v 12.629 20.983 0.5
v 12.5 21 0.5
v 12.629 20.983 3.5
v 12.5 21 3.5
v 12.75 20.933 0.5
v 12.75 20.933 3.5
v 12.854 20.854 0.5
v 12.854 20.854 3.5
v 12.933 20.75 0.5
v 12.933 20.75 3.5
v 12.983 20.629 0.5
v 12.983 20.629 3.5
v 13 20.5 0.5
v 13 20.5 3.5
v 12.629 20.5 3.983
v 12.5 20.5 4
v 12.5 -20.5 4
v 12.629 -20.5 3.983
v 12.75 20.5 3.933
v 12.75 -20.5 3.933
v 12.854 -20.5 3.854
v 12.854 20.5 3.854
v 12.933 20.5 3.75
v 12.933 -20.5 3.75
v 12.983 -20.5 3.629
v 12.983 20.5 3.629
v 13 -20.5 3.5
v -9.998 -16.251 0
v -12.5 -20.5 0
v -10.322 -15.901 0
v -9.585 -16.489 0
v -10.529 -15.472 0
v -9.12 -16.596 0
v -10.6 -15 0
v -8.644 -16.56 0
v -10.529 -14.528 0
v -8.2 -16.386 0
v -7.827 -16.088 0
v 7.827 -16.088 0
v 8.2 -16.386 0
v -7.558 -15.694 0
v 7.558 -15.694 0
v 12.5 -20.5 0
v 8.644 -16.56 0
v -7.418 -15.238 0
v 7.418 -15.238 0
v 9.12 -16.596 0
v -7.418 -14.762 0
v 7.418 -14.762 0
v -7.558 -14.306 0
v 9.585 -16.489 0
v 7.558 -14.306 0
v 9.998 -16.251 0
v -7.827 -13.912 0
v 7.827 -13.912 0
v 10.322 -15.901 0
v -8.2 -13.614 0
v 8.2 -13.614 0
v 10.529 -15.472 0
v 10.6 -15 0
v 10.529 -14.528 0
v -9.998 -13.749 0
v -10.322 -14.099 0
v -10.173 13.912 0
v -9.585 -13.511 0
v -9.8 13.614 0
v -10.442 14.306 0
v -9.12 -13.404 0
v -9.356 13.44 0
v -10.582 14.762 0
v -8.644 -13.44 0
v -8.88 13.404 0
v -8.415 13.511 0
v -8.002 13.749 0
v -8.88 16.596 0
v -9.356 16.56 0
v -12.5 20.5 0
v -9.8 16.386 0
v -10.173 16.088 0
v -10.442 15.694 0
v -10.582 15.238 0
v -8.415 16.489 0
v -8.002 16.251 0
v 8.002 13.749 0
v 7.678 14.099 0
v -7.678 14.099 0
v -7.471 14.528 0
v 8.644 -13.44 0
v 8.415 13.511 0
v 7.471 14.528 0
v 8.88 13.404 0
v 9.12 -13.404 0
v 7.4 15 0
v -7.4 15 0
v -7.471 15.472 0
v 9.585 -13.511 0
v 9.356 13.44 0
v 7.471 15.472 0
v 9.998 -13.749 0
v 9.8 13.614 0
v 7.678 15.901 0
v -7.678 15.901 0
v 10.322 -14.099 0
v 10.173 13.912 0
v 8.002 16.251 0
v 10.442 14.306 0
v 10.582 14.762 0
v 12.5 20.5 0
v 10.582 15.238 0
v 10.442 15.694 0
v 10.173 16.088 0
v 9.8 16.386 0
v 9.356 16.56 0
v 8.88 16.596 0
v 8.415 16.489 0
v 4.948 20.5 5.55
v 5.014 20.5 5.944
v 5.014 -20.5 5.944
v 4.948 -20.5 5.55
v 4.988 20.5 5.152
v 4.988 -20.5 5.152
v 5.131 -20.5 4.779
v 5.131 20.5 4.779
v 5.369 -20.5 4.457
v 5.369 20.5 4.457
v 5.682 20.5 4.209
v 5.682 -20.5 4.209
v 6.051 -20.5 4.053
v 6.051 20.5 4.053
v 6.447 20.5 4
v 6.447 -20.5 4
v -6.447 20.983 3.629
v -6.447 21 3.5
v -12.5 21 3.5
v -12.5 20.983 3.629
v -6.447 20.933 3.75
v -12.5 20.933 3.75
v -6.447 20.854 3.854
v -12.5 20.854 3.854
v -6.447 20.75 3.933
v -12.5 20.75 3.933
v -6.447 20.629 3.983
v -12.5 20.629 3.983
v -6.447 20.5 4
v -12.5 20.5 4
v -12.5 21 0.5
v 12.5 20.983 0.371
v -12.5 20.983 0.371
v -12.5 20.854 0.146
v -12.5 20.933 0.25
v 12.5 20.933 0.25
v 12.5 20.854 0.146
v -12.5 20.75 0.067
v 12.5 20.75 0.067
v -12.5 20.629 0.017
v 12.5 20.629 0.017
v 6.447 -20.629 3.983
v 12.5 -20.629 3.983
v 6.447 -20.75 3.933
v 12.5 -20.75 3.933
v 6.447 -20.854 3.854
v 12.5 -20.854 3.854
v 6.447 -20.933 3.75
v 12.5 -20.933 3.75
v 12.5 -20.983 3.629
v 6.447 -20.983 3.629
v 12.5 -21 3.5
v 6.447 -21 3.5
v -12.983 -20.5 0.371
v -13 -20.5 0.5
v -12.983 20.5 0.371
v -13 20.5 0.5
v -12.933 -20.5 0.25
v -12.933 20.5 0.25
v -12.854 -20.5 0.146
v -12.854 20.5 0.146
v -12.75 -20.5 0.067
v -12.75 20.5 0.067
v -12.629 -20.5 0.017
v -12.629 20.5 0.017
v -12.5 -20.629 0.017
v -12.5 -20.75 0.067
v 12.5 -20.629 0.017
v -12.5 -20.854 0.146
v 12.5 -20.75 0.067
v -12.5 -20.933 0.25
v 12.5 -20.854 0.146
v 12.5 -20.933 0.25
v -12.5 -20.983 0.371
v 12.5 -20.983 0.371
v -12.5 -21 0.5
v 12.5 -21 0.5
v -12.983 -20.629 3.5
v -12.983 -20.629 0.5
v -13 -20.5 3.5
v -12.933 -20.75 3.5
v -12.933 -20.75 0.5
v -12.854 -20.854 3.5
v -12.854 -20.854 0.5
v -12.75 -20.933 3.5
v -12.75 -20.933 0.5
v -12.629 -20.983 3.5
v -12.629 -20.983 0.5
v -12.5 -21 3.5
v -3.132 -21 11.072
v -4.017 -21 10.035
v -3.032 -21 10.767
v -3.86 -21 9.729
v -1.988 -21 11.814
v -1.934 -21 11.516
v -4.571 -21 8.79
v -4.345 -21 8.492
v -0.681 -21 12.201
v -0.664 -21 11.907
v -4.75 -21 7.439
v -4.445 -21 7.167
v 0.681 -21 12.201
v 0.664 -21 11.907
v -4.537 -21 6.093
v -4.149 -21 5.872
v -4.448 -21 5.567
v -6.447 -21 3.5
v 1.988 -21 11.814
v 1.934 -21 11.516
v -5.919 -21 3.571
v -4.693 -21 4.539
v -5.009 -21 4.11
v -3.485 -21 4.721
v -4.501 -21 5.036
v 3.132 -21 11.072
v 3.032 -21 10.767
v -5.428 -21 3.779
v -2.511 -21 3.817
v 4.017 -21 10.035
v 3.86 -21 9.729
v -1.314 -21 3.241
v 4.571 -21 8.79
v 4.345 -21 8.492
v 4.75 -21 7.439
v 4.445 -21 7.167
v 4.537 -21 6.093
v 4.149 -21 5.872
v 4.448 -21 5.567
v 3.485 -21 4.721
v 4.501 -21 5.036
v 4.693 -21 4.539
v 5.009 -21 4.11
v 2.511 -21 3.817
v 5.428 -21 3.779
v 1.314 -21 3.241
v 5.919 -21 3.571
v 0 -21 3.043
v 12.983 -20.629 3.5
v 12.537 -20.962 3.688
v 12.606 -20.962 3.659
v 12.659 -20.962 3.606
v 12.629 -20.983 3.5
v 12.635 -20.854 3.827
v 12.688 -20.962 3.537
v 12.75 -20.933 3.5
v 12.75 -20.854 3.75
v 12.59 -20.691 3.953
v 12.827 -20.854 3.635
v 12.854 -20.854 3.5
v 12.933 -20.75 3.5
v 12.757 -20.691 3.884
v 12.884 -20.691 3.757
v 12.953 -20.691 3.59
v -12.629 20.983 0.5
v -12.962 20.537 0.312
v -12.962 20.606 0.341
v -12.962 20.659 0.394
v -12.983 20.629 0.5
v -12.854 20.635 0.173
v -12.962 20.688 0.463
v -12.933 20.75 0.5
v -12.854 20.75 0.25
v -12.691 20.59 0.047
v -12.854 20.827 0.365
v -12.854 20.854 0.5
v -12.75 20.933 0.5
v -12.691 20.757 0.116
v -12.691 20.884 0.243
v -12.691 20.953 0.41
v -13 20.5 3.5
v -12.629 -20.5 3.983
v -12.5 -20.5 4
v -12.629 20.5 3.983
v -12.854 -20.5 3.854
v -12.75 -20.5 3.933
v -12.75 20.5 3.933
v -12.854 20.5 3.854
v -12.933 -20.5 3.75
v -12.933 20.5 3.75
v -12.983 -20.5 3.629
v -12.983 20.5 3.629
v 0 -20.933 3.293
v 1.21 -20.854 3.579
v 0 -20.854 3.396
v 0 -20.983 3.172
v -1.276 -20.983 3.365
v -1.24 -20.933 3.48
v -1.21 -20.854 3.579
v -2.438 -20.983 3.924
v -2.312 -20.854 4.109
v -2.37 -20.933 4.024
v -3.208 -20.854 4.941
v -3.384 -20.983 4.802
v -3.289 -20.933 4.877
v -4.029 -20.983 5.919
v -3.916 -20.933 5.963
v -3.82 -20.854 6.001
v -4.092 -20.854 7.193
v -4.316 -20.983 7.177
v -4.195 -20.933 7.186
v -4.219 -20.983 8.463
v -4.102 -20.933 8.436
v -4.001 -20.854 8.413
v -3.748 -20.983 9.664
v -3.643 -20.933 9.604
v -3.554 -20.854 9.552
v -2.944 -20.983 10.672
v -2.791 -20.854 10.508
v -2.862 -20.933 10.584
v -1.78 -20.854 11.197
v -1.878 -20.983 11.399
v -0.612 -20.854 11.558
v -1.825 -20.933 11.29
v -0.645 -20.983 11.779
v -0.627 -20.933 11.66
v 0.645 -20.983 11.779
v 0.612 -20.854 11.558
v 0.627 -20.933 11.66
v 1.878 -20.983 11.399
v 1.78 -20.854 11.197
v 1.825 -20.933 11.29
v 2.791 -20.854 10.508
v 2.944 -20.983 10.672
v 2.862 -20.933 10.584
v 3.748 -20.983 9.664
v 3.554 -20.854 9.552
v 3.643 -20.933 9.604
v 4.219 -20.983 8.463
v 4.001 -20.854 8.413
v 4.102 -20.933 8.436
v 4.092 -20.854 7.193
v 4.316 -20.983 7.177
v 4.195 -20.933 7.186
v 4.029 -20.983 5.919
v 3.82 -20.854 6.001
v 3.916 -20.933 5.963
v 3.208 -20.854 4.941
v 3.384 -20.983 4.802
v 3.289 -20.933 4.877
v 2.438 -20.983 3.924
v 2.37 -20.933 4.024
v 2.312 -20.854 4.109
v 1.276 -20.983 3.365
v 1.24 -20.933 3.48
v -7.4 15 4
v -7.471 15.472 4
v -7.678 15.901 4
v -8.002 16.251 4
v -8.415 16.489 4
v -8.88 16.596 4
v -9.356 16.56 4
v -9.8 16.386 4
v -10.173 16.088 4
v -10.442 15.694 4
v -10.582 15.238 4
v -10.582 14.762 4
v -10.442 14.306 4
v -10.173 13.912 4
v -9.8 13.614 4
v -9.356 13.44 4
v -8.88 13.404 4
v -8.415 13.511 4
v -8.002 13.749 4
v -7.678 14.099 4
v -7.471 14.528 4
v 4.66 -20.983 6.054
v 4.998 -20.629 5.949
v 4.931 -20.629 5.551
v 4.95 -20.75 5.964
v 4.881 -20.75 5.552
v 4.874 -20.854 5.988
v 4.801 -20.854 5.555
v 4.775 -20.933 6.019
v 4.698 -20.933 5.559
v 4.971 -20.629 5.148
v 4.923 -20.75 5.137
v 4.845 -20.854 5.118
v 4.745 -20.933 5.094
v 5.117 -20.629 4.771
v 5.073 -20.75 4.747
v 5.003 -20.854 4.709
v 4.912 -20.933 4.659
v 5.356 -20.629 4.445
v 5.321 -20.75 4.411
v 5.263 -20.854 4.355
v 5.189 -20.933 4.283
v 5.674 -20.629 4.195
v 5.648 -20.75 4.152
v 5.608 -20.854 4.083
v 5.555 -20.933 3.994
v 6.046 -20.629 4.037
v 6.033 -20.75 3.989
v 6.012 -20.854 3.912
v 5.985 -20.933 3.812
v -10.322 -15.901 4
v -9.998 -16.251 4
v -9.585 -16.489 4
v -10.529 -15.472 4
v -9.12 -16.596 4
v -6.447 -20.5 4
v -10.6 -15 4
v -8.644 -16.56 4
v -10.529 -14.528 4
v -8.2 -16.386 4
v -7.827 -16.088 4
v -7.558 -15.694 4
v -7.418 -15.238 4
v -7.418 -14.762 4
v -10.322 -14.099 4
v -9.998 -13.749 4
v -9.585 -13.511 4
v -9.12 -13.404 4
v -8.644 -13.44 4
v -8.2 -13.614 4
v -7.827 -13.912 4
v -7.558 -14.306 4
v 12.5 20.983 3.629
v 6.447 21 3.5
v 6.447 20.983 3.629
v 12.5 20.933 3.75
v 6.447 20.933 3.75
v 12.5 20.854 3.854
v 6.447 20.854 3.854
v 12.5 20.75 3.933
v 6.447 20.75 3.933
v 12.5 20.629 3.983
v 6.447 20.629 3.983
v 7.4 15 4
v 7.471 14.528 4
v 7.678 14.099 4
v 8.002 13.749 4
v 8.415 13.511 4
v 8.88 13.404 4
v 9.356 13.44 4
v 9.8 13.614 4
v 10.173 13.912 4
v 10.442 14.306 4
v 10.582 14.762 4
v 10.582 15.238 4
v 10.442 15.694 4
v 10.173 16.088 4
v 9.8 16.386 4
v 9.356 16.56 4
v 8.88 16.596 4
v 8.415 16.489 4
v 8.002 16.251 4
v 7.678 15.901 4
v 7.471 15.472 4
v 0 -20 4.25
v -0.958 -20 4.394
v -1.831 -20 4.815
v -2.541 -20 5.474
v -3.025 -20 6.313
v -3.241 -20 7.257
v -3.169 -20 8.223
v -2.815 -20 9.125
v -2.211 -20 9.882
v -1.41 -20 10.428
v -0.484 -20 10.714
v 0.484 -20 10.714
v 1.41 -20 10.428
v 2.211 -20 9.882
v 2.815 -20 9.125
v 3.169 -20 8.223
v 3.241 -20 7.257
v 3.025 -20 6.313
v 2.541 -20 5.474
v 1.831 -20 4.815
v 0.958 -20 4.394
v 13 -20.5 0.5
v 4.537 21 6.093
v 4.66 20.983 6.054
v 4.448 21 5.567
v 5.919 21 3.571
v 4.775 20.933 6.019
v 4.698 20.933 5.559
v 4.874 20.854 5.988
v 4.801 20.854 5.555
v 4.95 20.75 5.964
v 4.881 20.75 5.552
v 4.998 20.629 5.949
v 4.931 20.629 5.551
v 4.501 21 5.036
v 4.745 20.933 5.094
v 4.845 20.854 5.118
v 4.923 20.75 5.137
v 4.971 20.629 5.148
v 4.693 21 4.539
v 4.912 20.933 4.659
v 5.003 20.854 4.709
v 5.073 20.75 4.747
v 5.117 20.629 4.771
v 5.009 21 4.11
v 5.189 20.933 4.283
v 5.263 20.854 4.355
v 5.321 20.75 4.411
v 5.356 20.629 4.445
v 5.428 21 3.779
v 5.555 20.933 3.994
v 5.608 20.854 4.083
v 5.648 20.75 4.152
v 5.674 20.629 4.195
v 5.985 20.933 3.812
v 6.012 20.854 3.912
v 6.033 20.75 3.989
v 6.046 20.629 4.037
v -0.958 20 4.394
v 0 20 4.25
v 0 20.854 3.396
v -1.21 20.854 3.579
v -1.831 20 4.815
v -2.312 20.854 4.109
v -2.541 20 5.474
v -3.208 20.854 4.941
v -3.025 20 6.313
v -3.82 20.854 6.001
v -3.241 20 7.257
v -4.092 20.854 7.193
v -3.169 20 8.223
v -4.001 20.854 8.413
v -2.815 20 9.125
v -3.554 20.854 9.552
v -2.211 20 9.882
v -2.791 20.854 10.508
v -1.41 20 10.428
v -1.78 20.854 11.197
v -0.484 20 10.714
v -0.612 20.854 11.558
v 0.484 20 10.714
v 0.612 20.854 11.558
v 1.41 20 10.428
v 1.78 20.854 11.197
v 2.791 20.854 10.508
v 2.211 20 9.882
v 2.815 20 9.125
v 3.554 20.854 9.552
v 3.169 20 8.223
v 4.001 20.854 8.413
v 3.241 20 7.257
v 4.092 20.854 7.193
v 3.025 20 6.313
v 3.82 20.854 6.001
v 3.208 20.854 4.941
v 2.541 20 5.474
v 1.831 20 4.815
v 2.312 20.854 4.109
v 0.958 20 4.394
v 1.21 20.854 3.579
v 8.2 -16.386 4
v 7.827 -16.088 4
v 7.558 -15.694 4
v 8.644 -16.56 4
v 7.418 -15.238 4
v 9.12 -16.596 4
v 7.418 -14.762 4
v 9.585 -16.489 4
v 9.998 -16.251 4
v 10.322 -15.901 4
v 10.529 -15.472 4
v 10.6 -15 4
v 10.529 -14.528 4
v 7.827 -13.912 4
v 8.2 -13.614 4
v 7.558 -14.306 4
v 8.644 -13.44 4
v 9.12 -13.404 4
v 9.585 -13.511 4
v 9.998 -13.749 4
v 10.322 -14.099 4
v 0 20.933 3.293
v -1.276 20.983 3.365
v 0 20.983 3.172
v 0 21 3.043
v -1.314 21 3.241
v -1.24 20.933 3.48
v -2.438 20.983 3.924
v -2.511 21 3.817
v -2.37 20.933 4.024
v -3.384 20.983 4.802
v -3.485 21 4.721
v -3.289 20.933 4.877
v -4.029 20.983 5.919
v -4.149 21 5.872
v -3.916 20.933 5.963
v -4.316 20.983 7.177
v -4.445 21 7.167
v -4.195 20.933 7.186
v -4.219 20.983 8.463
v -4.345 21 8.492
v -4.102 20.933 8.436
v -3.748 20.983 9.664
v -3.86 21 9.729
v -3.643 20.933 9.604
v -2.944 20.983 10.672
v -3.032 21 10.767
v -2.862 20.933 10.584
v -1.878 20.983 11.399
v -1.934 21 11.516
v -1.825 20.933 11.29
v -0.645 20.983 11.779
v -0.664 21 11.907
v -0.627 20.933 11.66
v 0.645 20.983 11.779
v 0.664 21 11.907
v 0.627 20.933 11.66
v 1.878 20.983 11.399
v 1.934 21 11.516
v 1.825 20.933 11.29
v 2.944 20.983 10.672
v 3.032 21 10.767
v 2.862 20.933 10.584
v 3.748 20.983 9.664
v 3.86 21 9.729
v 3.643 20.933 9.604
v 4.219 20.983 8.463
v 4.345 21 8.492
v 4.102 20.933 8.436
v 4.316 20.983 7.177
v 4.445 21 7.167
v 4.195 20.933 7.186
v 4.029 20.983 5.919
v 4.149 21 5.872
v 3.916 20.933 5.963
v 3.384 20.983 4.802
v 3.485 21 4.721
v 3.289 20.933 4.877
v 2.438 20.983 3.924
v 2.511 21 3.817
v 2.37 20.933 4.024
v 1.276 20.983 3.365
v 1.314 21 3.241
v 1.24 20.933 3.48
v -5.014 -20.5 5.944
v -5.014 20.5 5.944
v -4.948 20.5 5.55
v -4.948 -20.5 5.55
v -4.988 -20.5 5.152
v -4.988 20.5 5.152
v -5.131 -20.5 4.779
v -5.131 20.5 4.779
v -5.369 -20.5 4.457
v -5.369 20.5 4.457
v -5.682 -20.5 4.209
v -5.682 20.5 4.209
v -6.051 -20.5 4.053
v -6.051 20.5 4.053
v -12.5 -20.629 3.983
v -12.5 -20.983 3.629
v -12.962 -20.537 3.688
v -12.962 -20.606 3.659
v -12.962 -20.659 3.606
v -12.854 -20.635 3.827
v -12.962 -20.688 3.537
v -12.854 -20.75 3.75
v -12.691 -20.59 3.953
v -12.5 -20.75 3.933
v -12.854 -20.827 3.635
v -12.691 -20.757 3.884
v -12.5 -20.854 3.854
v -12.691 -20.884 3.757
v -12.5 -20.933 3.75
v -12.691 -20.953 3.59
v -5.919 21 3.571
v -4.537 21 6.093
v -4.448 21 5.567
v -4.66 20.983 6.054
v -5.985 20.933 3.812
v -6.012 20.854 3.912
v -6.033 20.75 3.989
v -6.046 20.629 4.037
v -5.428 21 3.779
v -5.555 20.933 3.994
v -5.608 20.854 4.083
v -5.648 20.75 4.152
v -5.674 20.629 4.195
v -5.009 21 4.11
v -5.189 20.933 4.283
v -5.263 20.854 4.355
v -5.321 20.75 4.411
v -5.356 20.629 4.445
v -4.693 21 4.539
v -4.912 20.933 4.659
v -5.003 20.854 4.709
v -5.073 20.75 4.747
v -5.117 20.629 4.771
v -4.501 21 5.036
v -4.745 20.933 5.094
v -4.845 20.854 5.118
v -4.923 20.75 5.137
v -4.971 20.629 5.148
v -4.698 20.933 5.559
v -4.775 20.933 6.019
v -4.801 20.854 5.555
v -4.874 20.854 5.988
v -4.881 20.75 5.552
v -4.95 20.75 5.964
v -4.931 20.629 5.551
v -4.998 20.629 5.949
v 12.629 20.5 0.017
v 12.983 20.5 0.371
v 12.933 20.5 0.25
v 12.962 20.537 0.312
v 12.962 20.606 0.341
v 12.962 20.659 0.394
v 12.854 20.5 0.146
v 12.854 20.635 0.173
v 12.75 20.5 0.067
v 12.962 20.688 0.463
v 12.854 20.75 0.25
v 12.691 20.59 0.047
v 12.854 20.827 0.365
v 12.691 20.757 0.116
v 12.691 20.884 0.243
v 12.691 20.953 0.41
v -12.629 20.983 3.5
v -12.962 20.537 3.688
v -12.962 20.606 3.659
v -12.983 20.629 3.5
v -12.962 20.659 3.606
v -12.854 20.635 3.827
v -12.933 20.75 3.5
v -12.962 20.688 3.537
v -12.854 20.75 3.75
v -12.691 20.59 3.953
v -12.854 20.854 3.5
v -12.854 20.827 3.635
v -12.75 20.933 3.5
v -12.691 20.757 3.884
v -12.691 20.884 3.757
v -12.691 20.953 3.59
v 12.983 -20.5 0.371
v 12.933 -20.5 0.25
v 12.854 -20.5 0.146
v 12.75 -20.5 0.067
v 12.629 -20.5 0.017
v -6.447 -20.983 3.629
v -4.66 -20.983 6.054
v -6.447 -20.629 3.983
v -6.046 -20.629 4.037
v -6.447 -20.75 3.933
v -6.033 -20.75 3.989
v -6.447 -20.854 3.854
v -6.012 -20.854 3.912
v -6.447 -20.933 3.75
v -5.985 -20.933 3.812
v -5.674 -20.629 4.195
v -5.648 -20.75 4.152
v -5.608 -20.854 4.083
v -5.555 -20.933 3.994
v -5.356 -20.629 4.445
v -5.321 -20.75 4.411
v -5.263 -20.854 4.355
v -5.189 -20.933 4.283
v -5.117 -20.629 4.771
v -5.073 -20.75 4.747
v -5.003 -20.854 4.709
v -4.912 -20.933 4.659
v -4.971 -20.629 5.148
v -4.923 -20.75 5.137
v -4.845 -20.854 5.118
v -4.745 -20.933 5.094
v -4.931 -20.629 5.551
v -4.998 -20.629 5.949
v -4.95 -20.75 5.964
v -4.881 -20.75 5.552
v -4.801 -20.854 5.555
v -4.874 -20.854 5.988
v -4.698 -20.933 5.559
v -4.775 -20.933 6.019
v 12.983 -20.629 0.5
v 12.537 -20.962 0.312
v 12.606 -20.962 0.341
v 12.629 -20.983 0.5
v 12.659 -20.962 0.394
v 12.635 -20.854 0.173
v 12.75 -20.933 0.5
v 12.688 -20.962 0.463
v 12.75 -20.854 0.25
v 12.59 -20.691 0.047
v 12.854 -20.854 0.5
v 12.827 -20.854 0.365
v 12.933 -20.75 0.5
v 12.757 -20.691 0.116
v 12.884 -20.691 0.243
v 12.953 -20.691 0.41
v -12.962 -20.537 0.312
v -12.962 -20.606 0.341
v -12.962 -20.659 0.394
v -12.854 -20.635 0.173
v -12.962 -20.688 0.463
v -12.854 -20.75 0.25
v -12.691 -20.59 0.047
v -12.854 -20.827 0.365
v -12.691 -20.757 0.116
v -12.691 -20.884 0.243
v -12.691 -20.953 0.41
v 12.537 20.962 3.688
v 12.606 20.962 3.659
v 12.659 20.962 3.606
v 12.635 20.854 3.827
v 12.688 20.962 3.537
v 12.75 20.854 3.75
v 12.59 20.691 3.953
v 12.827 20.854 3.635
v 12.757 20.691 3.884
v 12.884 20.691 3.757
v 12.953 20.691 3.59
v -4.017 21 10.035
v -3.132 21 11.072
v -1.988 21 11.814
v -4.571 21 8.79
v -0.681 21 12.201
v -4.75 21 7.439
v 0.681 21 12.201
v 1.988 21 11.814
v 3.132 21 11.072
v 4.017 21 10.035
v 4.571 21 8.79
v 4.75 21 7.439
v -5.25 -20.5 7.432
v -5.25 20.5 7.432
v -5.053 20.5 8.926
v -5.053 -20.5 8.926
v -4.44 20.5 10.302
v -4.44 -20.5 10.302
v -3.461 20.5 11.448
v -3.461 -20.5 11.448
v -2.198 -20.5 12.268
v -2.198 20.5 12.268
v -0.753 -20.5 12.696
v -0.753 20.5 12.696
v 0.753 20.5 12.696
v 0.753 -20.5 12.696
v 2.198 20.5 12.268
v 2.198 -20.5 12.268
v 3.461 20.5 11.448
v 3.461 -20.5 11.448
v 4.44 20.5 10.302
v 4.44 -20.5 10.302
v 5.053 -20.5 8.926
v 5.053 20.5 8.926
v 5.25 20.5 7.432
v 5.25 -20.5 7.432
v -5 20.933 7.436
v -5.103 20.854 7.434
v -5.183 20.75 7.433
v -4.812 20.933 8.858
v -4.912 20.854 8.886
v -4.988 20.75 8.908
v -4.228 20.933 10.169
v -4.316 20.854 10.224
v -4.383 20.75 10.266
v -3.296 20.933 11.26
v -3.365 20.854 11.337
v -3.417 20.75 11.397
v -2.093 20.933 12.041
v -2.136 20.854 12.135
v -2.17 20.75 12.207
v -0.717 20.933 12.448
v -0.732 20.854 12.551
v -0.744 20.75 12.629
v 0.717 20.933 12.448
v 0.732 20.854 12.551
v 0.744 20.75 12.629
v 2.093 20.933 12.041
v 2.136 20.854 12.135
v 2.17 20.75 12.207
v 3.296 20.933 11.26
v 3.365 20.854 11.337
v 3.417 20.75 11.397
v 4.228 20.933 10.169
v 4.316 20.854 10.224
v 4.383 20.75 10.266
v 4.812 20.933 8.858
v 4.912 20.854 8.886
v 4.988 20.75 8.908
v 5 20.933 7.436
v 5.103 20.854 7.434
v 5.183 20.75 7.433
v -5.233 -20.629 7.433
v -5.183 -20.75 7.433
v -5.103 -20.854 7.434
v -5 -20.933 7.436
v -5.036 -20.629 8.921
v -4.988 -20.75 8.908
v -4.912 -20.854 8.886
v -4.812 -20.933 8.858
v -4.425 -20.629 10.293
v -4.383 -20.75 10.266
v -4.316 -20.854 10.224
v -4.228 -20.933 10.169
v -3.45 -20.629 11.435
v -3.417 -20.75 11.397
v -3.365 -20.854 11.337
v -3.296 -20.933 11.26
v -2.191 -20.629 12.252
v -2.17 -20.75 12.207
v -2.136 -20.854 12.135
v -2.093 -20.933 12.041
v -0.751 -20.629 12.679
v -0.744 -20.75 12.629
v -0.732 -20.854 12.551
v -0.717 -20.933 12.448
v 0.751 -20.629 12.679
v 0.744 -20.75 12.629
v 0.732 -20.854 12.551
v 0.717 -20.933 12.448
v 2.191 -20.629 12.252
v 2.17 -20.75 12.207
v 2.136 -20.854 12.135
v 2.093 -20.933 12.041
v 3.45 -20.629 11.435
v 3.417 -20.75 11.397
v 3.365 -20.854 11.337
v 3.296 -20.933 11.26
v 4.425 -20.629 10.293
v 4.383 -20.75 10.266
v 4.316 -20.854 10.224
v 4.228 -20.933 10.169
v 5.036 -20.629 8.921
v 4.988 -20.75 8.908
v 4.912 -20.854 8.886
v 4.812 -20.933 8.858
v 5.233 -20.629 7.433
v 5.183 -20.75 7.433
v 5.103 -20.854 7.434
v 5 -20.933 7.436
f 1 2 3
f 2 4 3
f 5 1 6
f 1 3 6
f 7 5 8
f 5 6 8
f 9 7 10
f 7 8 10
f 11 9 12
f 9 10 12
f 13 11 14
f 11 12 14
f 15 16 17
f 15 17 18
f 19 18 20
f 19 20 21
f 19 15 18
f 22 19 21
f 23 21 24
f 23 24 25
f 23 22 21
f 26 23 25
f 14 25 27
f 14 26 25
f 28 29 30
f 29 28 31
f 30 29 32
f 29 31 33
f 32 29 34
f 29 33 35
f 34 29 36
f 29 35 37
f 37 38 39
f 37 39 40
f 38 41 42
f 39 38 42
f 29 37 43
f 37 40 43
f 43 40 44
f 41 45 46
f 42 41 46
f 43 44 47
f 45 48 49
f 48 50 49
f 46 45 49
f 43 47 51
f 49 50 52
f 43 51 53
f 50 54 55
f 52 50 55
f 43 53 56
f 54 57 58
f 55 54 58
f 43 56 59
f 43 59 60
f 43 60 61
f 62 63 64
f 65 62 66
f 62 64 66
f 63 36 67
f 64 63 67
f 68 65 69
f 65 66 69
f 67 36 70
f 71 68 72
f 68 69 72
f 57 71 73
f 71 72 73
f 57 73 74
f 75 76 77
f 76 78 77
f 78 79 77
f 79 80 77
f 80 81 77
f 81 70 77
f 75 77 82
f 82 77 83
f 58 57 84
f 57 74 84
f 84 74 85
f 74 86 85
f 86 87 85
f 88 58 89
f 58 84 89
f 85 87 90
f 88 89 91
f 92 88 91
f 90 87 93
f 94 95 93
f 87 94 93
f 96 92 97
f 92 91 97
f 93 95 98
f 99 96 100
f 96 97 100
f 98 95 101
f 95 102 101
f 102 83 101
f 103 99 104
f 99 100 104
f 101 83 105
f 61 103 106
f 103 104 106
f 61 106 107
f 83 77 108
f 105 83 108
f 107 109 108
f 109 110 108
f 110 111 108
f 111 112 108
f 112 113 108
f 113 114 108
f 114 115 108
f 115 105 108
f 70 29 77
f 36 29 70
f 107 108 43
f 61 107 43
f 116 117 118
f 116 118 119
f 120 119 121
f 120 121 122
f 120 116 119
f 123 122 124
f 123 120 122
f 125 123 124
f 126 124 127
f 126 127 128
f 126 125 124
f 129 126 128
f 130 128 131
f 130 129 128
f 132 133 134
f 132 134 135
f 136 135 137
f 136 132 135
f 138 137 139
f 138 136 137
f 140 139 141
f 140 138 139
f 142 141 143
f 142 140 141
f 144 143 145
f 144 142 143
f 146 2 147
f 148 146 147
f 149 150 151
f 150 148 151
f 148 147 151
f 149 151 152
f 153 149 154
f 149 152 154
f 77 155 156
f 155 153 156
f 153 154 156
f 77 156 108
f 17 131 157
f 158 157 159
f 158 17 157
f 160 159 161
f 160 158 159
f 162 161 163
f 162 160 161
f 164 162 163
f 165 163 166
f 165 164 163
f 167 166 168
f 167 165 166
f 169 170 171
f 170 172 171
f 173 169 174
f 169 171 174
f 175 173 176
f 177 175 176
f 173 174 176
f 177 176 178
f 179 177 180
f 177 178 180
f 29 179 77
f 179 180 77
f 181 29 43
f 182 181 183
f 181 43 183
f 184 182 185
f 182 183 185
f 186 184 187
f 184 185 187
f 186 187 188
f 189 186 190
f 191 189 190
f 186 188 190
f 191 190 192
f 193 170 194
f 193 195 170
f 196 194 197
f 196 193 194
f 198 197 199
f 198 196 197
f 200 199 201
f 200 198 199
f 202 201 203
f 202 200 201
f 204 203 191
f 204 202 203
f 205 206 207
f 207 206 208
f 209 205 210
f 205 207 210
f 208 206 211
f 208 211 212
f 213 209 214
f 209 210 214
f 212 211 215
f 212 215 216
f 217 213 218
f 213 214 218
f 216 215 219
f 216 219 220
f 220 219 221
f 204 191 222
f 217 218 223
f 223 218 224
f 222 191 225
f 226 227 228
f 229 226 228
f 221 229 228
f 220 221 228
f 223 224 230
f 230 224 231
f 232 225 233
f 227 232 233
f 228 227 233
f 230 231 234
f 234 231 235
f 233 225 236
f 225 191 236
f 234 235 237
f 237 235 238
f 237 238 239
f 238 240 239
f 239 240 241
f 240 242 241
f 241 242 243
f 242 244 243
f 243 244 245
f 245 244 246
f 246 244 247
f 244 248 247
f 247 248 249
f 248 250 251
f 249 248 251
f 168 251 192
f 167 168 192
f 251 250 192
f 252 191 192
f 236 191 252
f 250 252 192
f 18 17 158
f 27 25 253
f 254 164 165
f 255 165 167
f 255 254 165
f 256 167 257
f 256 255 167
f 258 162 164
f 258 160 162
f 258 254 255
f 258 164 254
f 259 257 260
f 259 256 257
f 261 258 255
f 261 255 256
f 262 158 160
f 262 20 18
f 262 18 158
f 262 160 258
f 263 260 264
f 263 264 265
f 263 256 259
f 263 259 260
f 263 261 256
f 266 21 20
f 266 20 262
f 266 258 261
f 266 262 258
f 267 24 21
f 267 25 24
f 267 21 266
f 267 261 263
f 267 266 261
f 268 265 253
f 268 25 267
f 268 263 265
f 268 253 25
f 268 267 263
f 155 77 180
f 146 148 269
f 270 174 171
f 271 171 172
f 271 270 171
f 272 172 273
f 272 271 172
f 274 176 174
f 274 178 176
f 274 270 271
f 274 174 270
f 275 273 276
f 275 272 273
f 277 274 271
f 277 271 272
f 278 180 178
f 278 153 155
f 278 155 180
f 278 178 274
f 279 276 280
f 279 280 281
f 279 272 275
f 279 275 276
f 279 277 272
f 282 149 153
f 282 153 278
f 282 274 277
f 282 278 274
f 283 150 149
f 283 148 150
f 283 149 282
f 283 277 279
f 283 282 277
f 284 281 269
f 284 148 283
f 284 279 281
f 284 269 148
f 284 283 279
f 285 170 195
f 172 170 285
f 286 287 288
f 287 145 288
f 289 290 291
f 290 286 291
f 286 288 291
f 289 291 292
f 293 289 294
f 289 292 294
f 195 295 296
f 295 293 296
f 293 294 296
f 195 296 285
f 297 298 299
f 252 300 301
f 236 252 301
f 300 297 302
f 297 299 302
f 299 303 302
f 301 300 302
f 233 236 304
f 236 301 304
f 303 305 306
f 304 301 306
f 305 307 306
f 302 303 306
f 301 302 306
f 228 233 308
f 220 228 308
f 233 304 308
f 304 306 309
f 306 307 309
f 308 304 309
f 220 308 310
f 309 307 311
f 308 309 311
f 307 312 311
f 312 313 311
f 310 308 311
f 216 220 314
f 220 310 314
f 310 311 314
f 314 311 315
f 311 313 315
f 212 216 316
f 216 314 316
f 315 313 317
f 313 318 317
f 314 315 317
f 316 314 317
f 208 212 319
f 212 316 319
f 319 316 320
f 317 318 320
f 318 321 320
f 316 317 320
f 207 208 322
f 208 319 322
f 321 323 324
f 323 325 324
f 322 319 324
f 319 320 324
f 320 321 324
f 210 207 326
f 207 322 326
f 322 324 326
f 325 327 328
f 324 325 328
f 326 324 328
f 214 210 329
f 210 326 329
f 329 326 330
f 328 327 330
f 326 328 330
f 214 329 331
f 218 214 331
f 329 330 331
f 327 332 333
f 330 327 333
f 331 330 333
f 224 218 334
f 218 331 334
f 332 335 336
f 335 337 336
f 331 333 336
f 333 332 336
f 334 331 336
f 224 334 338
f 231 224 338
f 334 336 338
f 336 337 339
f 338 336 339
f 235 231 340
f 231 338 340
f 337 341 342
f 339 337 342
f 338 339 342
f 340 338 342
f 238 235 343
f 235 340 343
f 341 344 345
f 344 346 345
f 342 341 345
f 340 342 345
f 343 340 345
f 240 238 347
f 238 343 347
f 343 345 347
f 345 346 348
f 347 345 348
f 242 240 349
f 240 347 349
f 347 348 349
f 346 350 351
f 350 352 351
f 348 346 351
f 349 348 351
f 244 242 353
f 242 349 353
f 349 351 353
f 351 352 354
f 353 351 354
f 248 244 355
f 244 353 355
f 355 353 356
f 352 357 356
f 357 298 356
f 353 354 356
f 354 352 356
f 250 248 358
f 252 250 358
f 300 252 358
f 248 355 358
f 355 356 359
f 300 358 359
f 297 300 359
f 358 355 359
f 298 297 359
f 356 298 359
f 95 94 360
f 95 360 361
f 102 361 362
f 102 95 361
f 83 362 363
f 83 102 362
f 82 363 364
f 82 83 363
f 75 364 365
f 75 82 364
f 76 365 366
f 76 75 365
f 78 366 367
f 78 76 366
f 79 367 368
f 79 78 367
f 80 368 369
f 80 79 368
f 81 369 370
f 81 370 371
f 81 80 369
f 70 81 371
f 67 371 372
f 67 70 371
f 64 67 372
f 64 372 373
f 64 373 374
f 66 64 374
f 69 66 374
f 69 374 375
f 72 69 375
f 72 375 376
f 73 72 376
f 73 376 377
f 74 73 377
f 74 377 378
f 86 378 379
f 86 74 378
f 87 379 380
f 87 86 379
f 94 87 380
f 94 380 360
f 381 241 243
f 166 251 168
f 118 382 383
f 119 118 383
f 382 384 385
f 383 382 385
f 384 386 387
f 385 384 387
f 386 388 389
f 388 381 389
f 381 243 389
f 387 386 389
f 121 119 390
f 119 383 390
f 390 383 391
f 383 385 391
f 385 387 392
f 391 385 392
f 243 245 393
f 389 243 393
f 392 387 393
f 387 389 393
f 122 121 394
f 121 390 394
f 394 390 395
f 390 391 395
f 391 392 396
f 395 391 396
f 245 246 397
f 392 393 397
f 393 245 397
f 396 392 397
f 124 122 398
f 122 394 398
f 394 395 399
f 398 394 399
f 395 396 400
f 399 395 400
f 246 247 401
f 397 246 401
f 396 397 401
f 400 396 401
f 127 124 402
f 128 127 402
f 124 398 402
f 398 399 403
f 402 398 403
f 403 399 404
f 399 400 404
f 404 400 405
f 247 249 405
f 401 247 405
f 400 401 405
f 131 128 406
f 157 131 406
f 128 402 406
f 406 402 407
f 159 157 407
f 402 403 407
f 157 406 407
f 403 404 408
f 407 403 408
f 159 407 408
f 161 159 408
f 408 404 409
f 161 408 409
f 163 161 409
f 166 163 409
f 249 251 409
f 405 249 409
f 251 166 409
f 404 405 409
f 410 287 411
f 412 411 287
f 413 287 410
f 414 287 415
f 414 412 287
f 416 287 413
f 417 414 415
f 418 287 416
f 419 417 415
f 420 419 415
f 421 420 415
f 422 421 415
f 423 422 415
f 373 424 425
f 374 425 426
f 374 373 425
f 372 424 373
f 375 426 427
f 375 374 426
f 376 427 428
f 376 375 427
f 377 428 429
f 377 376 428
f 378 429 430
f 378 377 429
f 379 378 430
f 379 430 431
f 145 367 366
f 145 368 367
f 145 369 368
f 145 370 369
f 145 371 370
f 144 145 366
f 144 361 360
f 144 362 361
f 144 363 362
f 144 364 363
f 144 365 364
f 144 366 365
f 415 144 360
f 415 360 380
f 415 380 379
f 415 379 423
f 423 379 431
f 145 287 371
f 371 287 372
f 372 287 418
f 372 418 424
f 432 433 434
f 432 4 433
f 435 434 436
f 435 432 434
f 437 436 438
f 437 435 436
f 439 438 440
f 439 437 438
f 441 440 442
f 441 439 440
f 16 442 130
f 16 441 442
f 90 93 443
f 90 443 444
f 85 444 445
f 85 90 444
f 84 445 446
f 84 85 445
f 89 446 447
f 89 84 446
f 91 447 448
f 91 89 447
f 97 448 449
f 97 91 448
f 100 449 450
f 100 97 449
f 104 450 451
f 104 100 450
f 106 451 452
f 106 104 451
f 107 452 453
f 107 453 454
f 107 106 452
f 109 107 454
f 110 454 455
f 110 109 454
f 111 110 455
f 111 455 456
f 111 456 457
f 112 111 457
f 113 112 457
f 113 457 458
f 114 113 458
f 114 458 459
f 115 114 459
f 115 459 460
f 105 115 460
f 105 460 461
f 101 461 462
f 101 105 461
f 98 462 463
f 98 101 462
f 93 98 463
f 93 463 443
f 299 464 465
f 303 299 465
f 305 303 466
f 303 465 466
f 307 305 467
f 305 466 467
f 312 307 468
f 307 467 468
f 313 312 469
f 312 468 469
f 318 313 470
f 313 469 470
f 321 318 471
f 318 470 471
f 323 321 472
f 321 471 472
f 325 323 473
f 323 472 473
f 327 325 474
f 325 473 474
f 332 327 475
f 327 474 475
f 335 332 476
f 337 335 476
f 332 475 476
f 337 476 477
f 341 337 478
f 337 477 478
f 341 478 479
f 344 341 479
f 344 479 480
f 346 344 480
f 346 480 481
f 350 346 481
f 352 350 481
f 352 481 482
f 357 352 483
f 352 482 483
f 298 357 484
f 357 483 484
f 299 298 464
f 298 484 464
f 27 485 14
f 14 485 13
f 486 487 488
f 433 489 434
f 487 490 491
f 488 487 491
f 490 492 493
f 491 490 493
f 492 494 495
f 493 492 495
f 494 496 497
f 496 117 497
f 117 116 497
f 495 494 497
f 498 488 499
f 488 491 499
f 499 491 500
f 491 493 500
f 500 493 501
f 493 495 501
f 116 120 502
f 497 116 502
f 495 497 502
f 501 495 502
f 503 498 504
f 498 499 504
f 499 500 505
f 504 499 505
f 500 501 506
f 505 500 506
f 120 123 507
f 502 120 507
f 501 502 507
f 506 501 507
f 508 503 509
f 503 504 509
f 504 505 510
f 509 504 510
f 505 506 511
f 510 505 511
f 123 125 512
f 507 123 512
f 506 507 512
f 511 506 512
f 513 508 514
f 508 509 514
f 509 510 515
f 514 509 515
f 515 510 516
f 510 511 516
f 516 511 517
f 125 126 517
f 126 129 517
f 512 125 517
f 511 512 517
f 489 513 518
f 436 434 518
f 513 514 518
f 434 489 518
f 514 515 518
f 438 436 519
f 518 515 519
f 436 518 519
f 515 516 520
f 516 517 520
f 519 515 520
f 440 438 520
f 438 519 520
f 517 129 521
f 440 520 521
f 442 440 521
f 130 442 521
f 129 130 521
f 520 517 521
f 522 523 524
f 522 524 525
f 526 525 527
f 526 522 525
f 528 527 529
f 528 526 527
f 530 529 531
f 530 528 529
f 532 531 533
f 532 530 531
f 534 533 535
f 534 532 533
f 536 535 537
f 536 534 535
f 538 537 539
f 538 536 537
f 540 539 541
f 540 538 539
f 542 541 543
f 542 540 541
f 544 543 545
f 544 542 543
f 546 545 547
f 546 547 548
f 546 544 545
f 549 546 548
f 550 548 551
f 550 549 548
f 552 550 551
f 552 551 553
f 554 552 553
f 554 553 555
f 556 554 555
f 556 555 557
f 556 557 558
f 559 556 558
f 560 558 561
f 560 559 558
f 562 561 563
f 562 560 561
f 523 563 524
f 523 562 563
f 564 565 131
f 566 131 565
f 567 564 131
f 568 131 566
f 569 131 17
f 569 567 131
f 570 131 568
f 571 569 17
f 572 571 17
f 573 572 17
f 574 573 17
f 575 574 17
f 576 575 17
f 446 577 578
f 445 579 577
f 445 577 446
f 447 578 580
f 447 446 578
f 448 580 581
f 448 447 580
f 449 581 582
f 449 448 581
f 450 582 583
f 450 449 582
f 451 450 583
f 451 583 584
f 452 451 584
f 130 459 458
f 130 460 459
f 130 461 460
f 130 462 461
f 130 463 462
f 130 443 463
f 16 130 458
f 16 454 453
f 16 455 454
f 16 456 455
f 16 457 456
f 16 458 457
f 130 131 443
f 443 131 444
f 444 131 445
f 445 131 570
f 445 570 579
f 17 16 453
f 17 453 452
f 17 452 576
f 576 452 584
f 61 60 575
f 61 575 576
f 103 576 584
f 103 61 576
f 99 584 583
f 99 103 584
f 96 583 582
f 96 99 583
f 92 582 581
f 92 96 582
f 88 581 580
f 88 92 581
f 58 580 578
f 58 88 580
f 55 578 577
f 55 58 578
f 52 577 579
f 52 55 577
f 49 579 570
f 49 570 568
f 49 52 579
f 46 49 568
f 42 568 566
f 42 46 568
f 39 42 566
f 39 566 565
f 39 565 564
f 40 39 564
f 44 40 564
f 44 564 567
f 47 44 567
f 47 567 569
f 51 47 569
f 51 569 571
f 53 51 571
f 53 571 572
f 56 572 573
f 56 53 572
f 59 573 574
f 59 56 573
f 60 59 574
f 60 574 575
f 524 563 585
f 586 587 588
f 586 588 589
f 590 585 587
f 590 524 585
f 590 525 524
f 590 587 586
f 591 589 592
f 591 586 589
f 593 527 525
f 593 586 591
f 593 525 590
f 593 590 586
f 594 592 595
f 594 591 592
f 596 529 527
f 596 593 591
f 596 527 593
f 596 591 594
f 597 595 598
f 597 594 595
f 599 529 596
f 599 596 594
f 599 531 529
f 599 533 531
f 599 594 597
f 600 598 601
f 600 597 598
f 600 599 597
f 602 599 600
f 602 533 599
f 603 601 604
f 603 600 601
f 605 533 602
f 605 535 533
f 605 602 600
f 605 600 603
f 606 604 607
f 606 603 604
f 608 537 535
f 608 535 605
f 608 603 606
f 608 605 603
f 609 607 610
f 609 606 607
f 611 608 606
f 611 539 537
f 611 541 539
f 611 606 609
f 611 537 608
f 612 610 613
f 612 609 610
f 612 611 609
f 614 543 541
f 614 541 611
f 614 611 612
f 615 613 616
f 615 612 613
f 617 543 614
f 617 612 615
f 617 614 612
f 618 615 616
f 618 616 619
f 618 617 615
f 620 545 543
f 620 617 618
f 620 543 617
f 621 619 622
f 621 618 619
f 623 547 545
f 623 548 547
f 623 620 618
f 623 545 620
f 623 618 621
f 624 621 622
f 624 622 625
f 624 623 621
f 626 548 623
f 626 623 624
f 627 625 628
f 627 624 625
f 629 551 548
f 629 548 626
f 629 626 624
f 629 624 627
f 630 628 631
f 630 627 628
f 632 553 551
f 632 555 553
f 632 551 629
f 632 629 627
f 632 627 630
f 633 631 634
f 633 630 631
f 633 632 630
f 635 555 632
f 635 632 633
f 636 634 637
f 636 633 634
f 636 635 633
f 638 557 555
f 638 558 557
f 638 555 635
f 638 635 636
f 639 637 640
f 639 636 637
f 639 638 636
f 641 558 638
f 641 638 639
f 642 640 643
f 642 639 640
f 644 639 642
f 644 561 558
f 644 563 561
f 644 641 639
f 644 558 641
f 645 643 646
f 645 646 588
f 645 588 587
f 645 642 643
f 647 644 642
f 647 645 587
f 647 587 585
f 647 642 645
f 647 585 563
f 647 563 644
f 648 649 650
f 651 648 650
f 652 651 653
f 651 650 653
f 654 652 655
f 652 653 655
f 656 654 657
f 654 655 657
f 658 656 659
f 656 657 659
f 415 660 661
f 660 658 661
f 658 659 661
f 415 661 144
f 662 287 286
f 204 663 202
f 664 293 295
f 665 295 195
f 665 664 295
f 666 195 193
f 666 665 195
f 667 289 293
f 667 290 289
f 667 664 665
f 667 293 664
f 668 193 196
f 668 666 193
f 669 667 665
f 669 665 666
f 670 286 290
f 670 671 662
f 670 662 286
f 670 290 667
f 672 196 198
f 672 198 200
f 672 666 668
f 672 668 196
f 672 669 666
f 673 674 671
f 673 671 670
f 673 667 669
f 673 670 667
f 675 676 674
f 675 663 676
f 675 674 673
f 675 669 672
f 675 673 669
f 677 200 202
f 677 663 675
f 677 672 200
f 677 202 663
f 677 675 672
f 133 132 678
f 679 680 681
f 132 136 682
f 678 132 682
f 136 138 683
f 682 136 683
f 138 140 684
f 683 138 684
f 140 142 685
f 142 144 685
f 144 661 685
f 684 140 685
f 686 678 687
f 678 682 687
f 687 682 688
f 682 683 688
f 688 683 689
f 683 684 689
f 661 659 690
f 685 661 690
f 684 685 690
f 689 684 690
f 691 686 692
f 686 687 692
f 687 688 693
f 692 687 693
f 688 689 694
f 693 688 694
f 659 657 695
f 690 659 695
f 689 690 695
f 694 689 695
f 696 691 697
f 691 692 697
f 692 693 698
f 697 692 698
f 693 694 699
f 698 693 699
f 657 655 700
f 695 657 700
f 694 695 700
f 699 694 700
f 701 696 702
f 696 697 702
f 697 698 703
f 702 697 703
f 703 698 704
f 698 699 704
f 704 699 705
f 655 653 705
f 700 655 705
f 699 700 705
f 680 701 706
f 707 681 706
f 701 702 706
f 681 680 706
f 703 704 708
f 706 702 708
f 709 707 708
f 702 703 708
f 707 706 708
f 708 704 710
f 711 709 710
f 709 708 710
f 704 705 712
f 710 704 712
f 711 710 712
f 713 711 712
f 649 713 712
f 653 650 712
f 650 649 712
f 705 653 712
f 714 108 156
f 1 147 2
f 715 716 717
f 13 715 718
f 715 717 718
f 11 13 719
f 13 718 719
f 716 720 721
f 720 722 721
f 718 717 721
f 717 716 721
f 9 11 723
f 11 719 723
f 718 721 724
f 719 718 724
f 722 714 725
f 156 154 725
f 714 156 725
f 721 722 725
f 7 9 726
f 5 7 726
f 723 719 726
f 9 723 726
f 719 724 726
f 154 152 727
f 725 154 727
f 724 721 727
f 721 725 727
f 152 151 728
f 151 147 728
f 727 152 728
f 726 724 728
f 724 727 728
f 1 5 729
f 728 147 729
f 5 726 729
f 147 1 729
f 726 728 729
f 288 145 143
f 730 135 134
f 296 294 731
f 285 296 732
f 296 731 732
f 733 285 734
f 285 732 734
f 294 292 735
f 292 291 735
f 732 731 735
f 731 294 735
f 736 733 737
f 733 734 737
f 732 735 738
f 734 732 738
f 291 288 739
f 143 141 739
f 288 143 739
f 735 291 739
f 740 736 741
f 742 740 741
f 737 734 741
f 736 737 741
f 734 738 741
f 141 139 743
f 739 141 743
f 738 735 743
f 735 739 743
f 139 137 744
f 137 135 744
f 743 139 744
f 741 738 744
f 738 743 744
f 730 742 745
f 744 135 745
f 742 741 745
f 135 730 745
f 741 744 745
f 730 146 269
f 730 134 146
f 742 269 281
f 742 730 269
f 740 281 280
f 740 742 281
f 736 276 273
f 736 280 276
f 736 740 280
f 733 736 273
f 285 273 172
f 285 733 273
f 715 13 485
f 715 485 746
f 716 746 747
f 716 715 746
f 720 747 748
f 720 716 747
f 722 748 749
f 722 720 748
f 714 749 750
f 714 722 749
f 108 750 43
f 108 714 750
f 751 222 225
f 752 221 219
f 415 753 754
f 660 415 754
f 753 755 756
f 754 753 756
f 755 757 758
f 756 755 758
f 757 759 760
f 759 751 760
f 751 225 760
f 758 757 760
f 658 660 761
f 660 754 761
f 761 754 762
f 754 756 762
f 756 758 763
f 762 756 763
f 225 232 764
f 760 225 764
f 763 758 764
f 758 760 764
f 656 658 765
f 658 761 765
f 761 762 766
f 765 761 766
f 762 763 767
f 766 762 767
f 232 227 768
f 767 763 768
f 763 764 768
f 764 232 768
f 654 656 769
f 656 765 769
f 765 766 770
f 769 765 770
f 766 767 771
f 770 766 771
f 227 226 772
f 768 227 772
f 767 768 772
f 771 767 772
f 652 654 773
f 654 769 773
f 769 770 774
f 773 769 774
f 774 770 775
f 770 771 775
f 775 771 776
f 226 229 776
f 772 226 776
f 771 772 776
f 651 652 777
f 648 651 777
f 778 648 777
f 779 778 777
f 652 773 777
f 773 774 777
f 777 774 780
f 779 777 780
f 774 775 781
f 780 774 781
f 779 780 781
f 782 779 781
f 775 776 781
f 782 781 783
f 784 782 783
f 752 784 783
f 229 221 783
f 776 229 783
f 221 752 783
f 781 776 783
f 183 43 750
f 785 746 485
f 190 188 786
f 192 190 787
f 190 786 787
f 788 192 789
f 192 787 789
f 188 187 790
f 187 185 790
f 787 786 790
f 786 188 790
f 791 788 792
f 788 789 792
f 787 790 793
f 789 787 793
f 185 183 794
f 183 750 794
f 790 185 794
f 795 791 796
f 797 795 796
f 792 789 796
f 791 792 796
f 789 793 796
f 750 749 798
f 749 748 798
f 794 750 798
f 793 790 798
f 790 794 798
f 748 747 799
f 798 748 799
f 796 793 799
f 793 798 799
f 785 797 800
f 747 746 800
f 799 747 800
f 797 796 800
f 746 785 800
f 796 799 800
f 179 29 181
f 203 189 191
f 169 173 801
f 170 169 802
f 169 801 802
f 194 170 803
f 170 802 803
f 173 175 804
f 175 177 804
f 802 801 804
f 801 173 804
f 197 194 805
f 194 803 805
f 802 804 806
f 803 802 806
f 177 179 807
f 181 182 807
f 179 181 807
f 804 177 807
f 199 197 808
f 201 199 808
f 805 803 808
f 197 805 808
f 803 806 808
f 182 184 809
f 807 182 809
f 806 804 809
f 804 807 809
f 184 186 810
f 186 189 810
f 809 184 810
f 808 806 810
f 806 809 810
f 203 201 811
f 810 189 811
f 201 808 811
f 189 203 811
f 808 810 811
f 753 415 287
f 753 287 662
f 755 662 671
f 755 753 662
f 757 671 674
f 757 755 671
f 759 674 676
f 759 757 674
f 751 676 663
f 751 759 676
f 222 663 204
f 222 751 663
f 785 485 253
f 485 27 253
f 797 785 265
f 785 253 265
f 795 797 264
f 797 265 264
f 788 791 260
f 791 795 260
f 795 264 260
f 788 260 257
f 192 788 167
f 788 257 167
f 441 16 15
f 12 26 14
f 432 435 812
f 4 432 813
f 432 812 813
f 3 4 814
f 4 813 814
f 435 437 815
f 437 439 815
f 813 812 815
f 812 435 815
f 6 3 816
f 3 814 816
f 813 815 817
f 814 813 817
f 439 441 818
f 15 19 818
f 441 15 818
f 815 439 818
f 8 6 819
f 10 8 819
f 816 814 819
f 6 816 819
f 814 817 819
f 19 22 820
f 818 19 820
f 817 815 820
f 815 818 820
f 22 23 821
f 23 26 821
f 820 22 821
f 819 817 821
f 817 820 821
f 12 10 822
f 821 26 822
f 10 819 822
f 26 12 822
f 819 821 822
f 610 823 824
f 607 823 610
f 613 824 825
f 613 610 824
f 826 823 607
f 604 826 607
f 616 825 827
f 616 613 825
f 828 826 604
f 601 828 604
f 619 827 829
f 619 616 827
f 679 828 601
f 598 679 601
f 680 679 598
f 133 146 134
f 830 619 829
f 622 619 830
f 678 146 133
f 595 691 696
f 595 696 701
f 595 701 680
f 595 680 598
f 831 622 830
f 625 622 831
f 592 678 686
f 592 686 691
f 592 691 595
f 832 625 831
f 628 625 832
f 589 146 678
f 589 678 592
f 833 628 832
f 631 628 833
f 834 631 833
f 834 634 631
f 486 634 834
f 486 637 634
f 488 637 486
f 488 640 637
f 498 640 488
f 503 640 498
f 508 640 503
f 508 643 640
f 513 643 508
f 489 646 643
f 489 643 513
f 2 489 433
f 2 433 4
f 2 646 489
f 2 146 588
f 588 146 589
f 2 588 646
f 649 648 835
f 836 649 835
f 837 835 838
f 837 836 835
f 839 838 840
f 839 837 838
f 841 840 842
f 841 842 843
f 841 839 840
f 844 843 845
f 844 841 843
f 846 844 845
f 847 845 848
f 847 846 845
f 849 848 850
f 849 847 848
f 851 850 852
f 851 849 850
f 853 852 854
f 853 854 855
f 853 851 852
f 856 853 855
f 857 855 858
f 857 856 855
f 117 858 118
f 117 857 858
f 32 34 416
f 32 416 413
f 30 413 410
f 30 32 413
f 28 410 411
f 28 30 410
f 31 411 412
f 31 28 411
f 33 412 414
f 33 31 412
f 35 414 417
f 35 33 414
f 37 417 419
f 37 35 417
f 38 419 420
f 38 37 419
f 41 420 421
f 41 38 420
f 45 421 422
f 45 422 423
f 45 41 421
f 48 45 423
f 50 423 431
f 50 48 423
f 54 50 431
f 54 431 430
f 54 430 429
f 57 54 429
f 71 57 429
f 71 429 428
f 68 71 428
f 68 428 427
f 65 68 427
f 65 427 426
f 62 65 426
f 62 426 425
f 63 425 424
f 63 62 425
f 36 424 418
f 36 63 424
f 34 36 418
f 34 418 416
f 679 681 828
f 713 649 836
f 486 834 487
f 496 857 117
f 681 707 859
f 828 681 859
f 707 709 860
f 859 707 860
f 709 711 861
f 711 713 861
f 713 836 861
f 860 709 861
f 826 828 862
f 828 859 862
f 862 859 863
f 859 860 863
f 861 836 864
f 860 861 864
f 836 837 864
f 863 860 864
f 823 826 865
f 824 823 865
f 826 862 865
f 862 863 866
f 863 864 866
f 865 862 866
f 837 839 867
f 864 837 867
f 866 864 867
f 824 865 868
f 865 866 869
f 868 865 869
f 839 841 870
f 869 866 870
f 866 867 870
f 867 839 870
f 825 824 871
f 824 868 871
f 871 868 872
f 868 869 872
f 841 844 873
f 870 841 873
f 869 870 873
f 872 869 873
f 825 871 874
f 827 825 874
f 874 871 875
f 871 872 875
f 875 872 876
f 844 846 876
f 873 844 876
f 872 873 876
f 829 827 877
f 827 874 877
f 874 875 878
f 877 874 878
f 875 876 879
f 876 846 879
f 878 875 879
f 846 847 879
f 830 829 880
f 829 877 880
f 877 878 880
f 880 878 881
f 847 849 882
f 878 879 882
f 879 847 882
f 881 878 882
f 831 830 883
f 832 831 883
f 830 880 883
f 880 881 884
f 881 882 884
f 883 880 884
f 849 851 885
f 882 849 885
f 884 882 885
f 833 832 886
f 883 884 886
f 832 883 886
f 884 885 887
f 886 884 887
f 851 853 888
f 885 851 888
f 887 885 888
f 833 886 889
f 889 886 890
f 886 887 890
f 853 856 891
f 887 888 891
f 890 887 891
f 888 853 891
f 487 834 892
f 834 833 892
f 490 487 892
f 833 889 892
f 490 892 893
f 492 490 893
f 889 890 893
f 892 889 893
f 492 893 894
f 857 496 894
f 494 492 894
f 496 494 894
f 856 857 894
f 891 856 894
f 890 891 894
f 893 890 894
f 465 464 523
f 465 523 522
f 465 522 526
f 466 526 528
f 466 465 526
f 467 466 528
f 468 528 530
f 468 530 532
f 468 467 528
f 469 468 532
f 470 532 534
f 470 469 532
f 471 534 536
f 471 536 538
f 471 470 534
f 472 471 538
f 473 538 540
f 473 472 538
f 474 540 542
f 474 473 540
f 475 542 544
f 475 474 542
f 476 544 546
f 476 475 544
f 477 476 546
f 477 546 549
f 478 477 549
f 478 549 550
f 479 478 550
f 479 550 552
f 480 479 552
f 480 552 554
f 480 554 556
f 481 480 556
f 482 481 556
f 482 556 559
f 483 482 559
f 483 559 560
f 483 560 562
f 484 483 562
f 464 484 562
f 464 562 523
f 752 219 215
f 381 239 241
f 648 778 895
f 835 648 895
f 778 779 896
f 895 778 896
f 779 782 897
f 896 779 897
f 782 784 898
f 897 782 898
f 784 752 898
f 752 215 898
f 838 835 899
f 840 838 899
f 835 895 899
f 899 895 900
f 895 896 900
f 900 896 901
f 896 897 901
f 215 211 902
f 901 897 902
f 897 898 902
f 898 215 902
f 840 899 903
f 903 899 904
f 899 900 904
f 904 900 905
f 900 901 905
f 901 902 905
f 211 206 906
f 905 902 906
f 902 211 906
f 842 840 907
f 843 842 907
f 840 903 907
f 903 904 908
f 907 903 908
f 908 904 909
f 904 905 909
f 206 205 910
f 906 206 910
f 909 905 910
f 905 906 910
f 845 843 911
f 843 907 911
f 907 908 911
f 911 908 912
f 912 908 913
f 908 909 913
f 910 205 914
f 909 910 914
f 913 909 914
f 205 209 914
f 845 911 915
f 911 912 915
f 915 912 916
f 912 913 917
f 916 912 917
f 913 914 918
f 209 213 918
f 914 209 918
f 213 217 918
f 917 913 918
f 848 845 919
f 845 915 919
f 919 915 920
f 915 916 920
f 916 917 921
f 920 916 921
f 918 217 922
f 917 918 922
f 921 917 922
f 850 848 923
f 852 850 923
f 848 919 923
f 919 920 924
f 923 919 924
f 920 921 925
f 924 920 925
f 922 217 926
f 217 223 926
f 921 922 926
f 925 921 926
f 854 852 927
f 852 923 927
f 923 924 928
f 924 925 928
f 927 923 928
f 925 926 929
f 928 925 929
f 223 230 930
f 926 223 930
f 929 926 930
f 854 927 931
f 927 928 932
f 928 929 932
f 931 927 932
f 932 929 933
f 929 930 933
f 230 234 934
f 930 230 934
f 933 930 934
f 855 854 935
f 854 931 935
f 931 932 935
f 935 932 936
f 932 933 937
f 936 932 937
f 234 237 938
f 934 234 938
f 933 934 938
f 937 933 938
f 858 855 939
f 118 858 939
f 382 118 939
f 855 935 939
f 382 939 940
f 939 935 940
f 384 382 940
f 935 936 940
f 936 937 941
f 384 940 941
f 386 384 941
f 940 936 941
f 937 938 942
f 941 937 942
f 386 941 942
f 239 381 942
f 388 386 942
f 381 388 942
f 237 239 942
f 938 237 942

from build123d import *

# Parameters (mm, degrees)
SKETCH_1_W      = 26
SKETCH_1_H      = 42
SKETCH_1_R      = 1.6
EXTRUDE_1_DEPTH = 4
SKETCH_3_R      = 5.25
SKETCH_3_R_2    = 3.25
EXTRUDE_2_DEPTH = 21
FILLET_1_R      = 1.5
CHAMFER_1_SIZE  = 1
FILLET_3_R      = 0.5


with BuildPart() as part:
    # 草图1 → 凸台-拉伸1 (new body)
    with BuildSketch(Plane.XY):
        Rectangle(SKETCH_1_W, SKETCH_1_H)
        with Locations((-9, 15)):
            Circle(SKETCH_1_R, mode=Mode.SUBTRACT)
        with Locations(Location((-9, -15, 0), (0, 0, 180))):
            Circle(SKETCH_1_R, mode=Mode.SUBTRACT)
        with Locations((9, -15)):
            Circle(SKETCH_1_R, mode=Mode.SUBTRACT)
        with Locations(Location((9, 15, 0), (0, 0, 180))):
            Circle(SKETCH_1_R, mode=Mode.SUBTRACT)
    extrude(amount=EXTRUDE_1_DEPTH)

    # 草图3 → 凸台-拉伸2 (add, symmetric)
    with BuildSketch(Plane(origin=(0, 0, 0), x_dir=(1, 0, 0), z_dir=(0, 1, 0))):
        with Locations((0, -7.5)):
            Circle(SKETCH_3_R)
        with Locations(Location((0, -7.5, 0), (0, 0, 90))):
            Circle(SKETCH_3_R_2, mode=Mode.SUBTRACT)
    extrude(amount=EXTRUDE_2_DEPTH, both=True)

    # 圆角1
    fillet_1_edges = [part.edges().sort_by_distance(p)[0] for p in [
        (-3.913118961, 0, 4),
        (3.913118961, 0, 4),
    ]]
    fillet(fillet_1_edges, radius=FILLET_1_R)

    # 倒角1
    chamfer_1_edges = [part.edges().sort_by_distance(p)[0] for p in [
        (0, -21, 10.75),
        (0, 21, 10.75),
    ]]
    chamfer(chamfer_1_edges, length=CHAMFER_1_SIZE)

    # 圆角3
    fillet_3_edges = [part.edges().sort_by_distance(p)[0] for p in [
        (13, 0, 4),
        (9.72344924, 21, 4),
        (9.72344924, -21, 4),
        (0, -21, 12.75),
        (0, 21, 12.75),
        (-9.72344924, 21, 4),
        (5.23928375, -21, 4.610243479),
        (5.23928375, 21, 4.610243479),
        (-13, 0, 4),
        (0, 21, 0),
        (-5.23928375, 21, 4.610243479),
        (-5.23928375, -21, 4.610243479),
        (13, 0, 0),
        (0, -21, 0),
        (0, -21, 11.75),
        (0, 21, 11.75),
        (-13, 0, 0),
        (-13, 21, 2),
        (13, 21, 2),
        (13, -21, 2),
        (-13, -21, 2),
        (-9.72344924, -21, 4),
    ]]
    fillet(fillet_3_edges, radius=FILLET_3_R)


solid = part.part
